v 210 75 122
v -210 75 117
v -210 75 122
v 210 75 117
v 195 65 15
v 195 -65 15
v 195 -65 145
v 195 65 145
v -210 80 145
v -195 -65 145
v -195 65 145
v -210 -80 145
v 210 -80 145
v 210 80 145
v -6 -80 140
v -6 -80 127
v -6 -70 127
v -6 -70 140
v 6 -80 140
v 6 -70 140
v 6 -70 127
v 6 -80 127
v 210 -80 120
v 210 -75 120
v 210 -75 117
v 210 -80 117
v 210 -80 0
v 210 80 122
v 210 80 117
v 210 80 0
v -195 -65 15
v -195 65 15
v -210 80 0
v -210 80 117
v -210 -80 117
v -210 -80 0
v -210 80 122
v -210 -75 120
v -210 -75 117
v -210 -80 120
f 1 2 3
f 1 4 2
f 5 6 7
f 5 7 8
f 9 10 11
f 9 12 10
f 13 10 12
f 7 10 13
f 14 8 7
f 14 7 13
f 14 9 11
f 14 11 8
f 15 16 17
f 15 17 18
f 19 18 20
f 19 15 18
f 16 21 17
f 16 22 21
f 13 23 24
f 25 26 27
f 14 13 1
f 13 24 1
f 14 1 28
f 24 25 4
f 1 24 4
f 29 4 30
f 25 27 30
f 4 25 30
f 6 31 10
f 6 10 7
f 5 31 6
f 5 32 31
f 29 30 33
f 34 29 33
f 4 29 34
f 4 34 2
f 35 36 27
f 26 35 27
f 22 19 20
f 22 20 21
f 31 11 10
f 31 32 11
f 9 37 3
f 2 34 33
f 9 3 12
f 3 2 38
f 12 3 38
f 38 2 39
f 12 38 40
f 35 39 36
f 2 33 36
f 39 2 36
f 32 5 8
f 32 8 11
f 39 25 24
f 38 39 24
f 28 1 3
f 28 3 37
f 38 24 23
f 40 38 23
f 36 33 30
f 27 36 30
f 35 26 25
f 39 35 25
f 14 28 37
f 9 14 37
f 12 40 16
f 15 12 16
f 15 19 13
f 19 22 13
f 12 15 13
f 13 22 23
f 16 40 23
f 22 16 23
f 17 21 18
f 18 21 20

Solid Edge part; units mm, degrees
sketch "Sketch1" plane through (0, 0, 0) normal (0, 0, 1) x (1, 0, 0)
  line L0 (-210, 80) -> (-210, -80)
  line L1 (-210, -80) -> (210, -80)
  line L2 (210, -80) -> (210, 80)
  line L3 (210, 80) -> (-210, 80)
extrude "Protrusion1" add sketch "Sketch1" along normal blind 145
shell "Thinwall_2" thickness 15 removed faces 1 at (-144.2, -51.7333, 145)
sketch "Sketch2" plane through (0, -80, 72.5) normal (0, -1, 0) x (1, 0, 0)
  line L0 (-6, 64.5) -> (6, 64.5)
  line L1 (6, 64.5) -> (6, 54.5)
  line L2 (6, 54.5) -> (-6, 54.5)
  line L3 (-6, 54.5) -> (-6, 64.5)
extrude "Cutout1" cut sketch "Sketch2" against normal blind 10
sketch "Sketch3" plane through (0, -80, 72.5) normal (0, -1, 0) x (1, 0, 0)
  line L0 (-6, 67.5) -> (6, 67.5)
  line L1 (6, 67.5) -> (6, 64.5)
  line L2 (6, 64.5) -> (-6, 64.5)
  line L3 (-6, 64.5) -> (-6, 67.5)
extrude "Cutout2" cut sketch "Sketch3" against normal blind 10
sketch "Sketch4" plane through (210, 0, 72.5) normal (1, 0, 0) x (0, 1, 0)
  line L0 (-75, 47.5) -> (-80, 47.5)
  line L1 (-80, 47.5) -> (-80, 44.5)
  line L2 (-80, 44.5) -> (-75, 44.5)
  line L3 (-75, 44.5) -> (-75, 47.5)
  line L4 (75, 49.5) -> (80, 49.5)
  line L5 (80, 49.5) -> (80, 44.5)
  line L6 (80, 44.5) -> (75, 44.5)
  line L7 (75, 44.5) -> (75, 49.5)
extrude "Cutout3" cut sketch "Sketch4" against normal up to next
properties material "ABS Plastic, high impact"
